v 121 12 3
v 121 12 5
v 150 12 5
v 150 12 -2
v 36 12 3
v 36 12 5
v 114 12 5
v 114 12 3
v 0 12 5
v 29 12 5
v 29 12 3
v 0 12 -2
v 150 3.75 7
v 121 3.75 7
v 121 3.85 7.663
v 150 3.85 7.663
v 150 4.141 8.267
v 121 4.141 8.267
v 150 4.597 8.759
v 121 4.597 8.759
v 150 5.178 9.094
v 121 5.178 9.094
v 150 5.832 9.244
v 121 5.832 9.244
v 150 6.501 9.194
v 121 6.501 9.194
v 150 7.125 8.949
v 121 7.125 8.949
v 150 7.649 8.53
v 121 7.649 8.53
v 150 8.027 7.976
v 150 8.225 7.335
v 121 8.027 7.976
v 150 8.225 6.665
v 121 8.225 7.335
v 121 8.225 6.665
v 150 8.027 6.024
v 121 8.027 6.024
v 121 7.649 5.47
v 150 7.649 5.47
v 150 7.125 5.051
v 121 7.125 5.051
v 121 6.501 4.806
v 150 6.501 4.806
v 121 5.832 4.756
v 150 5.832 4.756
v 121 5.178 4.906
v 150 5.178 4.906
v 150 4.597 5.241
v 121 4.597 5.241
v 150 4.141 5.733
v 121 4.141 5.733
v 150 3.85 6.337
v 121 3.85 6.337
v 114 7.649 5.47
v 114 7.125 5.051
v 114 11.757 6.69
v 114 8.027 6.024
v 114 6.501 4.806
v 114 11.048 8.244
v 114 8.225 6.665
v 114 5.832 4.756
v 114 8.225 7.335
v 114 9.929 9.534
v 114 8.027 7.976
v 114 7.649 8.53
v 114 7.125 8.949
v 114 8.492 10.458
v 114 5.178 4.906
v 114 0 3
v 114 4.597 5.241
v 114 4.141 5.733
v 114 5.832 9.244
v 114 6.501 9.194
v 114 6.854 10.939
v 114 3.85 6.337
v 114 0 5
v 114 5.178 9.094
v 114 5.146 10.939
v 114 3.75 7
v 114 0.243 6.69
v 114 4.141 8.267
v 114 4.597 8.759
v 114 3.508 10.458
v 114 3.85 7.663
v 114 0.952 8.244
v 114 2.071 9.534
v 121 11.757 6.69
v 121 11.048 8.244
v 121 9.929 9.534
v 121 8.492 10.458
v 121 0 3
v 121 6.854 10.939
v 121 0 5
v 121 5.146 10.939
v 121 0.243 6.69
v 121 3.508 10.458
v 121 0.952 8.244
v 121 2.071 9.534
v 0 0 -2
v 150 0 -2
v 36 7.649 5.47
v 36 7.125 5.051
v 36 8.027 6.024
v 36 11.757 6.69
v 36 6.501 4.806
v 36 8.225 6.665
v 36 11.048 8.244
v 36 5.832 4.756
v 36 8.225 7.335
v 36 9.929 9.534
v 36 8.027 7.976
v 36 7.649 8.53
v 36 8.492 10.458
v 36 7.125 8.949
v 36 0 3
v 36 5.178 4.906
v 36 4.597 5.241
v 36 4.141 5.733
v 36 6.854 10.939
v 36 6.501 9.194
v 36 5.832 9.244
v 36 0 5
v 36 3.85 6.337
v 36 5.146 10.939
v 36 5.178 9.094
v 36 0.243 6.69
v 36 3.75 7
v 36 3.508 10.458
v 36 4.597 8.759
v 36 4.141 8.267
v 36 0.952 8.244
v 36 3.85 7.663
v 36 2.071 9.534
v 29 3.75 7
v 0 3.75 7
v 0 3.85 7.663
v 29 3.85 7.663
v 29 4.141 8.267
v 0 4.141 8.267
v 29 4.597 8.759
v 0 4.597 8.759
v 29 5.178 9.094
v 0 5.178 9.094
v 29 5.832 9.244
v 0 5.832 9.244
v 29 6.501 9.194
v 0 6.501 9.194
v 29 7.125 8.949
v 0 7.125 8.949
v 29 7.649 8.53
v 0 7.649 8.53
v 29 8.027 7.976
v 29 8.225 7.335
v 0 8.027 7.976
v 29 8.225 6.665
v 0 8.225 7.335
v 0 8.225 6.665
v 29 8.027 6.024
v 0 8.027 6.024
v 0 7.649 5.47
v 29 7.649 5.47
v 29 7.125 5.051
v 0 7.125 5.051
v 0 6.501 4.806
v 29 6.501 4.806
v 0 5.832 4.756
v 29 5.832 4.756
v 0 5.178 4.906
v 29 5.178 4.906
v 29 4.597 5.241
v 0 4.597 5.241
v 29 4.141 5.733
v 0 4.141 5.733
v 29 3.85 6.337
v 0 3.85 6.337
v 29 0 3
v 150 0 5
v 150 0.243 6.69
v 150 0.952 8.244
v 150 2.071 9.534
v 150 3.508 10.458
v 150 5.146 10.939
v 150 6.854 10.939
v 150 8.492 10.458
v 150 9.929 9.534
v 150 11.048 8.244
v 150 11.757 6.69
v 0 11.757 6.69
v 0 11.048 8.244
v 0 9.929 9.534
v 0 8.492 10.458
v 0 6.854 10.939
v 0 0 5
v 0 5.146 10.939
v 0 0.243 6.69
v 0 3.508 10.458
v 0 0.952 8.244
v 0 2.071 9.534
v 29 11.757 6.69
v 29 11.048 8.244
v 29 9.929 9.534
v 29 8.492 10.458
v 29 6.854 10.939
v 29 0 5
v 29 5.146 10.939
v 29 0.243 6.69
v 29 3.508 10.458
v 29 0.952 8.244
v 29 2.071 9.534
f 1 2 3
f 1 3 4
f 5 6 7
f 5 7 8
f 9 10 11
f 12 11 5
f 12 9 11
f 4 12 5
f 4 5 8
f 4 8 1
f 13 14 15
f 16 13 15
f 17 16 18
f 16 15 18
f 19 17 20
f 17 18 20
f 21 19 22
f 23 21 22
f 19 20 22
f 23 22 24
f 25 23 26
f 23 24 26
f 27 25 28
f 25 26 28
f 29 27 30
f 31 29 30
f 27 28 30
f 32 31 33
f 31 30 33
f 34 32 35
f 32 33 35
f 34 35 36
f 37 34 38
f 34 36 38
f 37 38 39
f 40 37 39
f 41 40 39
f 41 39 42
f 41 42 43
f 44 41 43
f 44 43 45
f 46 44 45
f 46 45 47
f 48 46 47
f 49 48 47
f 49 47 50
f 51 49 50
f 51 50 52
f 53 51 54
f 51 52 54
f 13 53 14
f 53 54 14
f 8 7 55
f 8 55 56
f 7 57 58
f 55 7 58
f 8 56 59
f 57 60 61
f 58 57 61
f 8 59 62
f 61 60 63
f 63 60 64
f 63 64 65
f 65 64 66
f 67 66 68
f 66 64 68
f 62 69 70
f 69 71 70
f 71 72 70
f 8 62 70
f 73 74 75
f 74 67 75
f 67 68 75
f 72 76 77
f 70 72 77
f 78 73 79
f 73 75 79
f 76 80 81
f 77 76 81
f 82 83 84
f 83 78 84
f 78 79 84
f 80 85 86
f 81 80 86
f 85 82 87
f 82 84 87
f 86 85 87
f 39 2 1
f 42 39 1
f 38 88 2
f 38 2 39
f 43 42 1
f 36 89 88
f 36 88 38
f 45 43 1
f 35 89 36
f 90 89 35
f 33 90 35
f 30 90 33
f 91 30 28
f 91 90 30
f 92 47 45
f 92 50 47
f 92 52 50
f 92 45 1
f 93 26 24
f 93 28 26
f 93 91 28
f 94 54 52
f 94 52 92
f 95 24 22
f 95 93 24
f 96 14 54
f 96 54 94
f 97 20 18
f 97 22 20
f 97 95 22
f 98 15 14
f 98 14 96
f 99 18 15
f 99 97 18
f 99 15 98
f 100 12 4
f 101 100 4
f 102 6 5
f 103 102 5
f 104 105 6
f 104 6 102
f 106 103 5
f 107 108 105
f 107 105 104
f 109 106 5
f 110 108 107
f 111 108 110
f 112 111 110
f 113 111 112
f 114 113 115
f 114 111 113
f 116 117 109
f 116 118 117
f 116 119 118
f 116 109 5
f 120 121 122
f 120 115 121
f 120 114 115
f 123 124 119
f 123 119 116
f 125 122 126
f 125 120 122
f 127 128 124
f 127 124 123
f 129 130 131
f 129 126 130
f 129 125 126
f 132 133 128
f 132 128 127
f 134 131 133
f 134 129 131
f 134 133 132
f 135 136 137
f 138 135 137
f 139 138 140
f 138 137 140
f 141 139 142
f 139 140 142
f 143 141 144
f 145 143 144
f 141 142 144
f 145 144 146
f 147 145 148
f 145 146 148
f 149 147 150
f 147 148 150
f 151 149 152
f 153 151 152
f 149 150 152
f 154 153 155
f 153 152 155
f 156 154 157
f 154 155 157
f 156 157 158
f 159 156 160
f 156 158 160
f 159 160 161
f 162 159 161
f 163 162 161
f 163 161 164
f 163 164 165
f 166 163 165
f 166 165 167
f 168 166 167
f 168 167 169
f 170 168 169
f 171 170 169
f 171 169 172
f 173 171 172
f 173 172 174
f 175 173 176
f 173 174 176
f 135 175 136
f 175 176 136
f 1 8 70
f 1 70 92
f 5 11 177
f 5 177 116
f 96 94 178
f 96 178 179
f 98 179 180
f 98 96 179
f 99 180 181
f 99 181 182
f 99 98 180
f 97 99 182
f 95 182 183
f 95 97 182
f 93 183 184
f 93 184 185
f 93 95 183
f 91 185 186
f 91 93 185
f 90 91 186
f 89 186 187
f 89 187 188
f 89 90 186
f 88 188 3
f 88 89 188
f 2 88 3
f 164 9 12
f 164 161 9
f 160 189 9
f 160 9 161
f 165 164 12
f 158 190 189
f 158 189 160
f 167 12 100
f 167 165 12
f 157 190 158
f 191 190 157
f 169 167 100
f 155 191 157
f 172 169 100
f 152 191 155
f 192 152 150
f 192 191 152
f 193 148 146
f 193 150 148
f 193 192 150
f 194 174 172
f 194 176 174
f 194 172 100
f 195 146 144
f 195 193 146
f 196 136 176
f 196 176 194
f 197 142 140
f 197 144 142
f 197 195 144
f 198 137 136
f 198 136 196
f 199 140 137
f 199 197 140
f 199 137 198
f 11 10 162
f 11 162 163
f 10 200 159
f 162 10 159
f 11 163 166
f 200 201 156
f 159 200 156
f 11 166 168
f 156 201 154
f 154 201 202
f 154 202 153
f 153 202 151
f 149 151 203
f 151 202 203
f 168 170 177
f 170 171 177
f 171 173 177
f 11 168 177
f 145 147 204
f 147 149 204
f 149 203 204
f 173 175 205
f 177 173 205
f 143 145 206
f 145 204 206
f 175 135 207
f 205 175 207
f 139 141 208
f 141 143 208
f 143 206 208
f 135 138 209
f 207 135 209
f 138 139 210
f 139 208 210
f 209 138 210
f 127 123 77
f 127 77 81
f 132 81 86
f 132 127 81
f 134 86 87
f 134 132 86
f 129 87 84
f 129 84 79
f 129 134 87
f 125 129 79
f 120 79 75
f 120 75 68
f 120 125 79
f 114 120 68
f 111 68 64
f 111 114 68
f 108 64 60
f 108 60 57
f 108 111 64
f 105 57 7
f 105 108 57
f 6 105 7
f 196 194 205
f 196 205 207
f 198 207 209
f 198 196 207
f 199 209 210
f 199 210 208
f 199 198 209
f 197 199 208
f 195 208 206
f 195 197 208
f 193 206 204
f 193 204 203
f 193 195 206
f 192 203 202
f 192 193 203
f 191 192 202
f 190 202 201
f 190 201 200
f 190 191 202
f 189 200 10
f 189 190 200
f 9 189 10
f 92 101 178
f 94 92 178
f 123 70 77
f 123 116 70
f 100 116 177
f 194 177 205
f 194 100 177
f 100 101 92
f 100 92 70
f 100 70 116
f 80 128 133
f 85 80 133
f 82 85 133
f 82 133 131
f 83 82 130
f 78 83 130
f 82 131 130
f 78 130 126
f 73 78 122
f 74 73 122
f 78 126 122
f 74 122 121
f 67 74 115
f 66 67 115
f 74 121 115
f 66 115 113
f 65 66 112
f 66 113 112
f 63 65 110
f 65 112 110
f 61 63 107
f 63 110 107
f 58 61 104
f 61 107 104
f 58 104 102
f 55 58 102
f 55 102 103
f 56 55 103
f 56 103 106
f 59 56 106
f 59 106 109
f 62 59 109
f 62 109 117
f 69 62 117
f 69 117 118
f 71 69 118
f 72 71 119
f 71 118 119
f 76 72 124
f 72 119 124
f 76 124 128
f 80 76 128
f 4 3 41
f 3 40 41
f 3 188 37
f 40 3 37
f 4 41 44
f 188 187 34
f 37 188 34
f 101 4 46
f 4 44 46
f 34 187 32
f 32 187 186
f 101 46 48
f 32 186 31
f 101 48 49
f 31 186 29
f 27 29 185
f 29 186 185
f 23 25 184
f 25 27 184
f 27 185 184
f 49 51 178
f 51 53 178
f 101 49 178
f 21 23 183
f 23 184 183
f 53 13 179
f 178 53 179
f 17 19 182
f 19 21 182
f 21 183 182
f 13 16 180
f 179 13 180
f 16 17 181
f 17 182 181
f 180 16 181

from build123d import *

# Parameters (mm, degrees)
F0_W          = 150
F0_H          = 12
F1_DEPTH      = 3
F1_DEPTH_BACK = 2
F2_R          = 2.25
F3_DEPTH      = 29
F4_START      = -36
F4_DEPTH      = 78
F5_START      = -121
F5_DEPTH      = 29


with BuildPart() as f1:
    # F0 (on Top) → F1 (new body, two sides)
    with BuildSketch(Plane.XY) as f1_sk:
        with Locations((75, 6)):
            Rectangle(F0_W, F0_H)
    extrude(amount=F1_DEPTH)
    extrude(f1_sk.sketch, amount=-F1_DEPTH_BACK)

    # F2 (on face) → F3 (join)
    with BuildSketch(Plane(origin=(0, 0, 0), x_dir=(0, -1, 0), z_dir=(-1, 0, 0))):
        with BuildLine():
            Line((-12, 5), (-12, 3))
            Line((-12, 3), (0, 3))
            Line((0, 3), (0, 5))
            ThreePointArc((0, 5), (-6, 11), (-12, 5))
        make_face()
        with Locations((-6, 7)):
            Circle(F2_R, mode=Mode.SUBTRACT)
    extrude(amount=-F3_DEPTH)

    # F2 (on face) → F4 (join)
    with BuildSketch(Plane(origin=(0, 0, 0), x_dir=(0, -1, 0), z_dir=(-1, 0, 0)).offset(F4_START)):
        with BuildLine():
            Line((-12, 5), (-12, 3))
            Line((-12, 3), (0, 3))
            Line((0, 3), (0, 5))
            ThreePointArc((0, 5), (-6, 11), (-12, 5))
        make_face()
        with Locations((-6, 7)):
            Circle(F2_R, mode=Mode.SUBTRACT)
    extrude(amount=-F4_DEPTH)

    # F2 (on face) → F5 (join)
    with BuildSketch(Plane(origin=(0, 0, 0), x_dir=(0, -1, 0), z_dir=(-1, 0, 0)).offset(F5_START)):
        with BuildLine():
            Line((-12, 5), (-12, 3))
            Line((-12, 3), (0, 3))
            Line((0, 3), (0, 5))
            ThreePointArc((0, 5), (-6, 11), (-12, 5))
        make_face()
        with Locations((-6, 7)):
            Circle(F2_R, mode=Mode.SUBTRACT)
    extrude(amount=-F5_DEPTH)


solid = f1.part
